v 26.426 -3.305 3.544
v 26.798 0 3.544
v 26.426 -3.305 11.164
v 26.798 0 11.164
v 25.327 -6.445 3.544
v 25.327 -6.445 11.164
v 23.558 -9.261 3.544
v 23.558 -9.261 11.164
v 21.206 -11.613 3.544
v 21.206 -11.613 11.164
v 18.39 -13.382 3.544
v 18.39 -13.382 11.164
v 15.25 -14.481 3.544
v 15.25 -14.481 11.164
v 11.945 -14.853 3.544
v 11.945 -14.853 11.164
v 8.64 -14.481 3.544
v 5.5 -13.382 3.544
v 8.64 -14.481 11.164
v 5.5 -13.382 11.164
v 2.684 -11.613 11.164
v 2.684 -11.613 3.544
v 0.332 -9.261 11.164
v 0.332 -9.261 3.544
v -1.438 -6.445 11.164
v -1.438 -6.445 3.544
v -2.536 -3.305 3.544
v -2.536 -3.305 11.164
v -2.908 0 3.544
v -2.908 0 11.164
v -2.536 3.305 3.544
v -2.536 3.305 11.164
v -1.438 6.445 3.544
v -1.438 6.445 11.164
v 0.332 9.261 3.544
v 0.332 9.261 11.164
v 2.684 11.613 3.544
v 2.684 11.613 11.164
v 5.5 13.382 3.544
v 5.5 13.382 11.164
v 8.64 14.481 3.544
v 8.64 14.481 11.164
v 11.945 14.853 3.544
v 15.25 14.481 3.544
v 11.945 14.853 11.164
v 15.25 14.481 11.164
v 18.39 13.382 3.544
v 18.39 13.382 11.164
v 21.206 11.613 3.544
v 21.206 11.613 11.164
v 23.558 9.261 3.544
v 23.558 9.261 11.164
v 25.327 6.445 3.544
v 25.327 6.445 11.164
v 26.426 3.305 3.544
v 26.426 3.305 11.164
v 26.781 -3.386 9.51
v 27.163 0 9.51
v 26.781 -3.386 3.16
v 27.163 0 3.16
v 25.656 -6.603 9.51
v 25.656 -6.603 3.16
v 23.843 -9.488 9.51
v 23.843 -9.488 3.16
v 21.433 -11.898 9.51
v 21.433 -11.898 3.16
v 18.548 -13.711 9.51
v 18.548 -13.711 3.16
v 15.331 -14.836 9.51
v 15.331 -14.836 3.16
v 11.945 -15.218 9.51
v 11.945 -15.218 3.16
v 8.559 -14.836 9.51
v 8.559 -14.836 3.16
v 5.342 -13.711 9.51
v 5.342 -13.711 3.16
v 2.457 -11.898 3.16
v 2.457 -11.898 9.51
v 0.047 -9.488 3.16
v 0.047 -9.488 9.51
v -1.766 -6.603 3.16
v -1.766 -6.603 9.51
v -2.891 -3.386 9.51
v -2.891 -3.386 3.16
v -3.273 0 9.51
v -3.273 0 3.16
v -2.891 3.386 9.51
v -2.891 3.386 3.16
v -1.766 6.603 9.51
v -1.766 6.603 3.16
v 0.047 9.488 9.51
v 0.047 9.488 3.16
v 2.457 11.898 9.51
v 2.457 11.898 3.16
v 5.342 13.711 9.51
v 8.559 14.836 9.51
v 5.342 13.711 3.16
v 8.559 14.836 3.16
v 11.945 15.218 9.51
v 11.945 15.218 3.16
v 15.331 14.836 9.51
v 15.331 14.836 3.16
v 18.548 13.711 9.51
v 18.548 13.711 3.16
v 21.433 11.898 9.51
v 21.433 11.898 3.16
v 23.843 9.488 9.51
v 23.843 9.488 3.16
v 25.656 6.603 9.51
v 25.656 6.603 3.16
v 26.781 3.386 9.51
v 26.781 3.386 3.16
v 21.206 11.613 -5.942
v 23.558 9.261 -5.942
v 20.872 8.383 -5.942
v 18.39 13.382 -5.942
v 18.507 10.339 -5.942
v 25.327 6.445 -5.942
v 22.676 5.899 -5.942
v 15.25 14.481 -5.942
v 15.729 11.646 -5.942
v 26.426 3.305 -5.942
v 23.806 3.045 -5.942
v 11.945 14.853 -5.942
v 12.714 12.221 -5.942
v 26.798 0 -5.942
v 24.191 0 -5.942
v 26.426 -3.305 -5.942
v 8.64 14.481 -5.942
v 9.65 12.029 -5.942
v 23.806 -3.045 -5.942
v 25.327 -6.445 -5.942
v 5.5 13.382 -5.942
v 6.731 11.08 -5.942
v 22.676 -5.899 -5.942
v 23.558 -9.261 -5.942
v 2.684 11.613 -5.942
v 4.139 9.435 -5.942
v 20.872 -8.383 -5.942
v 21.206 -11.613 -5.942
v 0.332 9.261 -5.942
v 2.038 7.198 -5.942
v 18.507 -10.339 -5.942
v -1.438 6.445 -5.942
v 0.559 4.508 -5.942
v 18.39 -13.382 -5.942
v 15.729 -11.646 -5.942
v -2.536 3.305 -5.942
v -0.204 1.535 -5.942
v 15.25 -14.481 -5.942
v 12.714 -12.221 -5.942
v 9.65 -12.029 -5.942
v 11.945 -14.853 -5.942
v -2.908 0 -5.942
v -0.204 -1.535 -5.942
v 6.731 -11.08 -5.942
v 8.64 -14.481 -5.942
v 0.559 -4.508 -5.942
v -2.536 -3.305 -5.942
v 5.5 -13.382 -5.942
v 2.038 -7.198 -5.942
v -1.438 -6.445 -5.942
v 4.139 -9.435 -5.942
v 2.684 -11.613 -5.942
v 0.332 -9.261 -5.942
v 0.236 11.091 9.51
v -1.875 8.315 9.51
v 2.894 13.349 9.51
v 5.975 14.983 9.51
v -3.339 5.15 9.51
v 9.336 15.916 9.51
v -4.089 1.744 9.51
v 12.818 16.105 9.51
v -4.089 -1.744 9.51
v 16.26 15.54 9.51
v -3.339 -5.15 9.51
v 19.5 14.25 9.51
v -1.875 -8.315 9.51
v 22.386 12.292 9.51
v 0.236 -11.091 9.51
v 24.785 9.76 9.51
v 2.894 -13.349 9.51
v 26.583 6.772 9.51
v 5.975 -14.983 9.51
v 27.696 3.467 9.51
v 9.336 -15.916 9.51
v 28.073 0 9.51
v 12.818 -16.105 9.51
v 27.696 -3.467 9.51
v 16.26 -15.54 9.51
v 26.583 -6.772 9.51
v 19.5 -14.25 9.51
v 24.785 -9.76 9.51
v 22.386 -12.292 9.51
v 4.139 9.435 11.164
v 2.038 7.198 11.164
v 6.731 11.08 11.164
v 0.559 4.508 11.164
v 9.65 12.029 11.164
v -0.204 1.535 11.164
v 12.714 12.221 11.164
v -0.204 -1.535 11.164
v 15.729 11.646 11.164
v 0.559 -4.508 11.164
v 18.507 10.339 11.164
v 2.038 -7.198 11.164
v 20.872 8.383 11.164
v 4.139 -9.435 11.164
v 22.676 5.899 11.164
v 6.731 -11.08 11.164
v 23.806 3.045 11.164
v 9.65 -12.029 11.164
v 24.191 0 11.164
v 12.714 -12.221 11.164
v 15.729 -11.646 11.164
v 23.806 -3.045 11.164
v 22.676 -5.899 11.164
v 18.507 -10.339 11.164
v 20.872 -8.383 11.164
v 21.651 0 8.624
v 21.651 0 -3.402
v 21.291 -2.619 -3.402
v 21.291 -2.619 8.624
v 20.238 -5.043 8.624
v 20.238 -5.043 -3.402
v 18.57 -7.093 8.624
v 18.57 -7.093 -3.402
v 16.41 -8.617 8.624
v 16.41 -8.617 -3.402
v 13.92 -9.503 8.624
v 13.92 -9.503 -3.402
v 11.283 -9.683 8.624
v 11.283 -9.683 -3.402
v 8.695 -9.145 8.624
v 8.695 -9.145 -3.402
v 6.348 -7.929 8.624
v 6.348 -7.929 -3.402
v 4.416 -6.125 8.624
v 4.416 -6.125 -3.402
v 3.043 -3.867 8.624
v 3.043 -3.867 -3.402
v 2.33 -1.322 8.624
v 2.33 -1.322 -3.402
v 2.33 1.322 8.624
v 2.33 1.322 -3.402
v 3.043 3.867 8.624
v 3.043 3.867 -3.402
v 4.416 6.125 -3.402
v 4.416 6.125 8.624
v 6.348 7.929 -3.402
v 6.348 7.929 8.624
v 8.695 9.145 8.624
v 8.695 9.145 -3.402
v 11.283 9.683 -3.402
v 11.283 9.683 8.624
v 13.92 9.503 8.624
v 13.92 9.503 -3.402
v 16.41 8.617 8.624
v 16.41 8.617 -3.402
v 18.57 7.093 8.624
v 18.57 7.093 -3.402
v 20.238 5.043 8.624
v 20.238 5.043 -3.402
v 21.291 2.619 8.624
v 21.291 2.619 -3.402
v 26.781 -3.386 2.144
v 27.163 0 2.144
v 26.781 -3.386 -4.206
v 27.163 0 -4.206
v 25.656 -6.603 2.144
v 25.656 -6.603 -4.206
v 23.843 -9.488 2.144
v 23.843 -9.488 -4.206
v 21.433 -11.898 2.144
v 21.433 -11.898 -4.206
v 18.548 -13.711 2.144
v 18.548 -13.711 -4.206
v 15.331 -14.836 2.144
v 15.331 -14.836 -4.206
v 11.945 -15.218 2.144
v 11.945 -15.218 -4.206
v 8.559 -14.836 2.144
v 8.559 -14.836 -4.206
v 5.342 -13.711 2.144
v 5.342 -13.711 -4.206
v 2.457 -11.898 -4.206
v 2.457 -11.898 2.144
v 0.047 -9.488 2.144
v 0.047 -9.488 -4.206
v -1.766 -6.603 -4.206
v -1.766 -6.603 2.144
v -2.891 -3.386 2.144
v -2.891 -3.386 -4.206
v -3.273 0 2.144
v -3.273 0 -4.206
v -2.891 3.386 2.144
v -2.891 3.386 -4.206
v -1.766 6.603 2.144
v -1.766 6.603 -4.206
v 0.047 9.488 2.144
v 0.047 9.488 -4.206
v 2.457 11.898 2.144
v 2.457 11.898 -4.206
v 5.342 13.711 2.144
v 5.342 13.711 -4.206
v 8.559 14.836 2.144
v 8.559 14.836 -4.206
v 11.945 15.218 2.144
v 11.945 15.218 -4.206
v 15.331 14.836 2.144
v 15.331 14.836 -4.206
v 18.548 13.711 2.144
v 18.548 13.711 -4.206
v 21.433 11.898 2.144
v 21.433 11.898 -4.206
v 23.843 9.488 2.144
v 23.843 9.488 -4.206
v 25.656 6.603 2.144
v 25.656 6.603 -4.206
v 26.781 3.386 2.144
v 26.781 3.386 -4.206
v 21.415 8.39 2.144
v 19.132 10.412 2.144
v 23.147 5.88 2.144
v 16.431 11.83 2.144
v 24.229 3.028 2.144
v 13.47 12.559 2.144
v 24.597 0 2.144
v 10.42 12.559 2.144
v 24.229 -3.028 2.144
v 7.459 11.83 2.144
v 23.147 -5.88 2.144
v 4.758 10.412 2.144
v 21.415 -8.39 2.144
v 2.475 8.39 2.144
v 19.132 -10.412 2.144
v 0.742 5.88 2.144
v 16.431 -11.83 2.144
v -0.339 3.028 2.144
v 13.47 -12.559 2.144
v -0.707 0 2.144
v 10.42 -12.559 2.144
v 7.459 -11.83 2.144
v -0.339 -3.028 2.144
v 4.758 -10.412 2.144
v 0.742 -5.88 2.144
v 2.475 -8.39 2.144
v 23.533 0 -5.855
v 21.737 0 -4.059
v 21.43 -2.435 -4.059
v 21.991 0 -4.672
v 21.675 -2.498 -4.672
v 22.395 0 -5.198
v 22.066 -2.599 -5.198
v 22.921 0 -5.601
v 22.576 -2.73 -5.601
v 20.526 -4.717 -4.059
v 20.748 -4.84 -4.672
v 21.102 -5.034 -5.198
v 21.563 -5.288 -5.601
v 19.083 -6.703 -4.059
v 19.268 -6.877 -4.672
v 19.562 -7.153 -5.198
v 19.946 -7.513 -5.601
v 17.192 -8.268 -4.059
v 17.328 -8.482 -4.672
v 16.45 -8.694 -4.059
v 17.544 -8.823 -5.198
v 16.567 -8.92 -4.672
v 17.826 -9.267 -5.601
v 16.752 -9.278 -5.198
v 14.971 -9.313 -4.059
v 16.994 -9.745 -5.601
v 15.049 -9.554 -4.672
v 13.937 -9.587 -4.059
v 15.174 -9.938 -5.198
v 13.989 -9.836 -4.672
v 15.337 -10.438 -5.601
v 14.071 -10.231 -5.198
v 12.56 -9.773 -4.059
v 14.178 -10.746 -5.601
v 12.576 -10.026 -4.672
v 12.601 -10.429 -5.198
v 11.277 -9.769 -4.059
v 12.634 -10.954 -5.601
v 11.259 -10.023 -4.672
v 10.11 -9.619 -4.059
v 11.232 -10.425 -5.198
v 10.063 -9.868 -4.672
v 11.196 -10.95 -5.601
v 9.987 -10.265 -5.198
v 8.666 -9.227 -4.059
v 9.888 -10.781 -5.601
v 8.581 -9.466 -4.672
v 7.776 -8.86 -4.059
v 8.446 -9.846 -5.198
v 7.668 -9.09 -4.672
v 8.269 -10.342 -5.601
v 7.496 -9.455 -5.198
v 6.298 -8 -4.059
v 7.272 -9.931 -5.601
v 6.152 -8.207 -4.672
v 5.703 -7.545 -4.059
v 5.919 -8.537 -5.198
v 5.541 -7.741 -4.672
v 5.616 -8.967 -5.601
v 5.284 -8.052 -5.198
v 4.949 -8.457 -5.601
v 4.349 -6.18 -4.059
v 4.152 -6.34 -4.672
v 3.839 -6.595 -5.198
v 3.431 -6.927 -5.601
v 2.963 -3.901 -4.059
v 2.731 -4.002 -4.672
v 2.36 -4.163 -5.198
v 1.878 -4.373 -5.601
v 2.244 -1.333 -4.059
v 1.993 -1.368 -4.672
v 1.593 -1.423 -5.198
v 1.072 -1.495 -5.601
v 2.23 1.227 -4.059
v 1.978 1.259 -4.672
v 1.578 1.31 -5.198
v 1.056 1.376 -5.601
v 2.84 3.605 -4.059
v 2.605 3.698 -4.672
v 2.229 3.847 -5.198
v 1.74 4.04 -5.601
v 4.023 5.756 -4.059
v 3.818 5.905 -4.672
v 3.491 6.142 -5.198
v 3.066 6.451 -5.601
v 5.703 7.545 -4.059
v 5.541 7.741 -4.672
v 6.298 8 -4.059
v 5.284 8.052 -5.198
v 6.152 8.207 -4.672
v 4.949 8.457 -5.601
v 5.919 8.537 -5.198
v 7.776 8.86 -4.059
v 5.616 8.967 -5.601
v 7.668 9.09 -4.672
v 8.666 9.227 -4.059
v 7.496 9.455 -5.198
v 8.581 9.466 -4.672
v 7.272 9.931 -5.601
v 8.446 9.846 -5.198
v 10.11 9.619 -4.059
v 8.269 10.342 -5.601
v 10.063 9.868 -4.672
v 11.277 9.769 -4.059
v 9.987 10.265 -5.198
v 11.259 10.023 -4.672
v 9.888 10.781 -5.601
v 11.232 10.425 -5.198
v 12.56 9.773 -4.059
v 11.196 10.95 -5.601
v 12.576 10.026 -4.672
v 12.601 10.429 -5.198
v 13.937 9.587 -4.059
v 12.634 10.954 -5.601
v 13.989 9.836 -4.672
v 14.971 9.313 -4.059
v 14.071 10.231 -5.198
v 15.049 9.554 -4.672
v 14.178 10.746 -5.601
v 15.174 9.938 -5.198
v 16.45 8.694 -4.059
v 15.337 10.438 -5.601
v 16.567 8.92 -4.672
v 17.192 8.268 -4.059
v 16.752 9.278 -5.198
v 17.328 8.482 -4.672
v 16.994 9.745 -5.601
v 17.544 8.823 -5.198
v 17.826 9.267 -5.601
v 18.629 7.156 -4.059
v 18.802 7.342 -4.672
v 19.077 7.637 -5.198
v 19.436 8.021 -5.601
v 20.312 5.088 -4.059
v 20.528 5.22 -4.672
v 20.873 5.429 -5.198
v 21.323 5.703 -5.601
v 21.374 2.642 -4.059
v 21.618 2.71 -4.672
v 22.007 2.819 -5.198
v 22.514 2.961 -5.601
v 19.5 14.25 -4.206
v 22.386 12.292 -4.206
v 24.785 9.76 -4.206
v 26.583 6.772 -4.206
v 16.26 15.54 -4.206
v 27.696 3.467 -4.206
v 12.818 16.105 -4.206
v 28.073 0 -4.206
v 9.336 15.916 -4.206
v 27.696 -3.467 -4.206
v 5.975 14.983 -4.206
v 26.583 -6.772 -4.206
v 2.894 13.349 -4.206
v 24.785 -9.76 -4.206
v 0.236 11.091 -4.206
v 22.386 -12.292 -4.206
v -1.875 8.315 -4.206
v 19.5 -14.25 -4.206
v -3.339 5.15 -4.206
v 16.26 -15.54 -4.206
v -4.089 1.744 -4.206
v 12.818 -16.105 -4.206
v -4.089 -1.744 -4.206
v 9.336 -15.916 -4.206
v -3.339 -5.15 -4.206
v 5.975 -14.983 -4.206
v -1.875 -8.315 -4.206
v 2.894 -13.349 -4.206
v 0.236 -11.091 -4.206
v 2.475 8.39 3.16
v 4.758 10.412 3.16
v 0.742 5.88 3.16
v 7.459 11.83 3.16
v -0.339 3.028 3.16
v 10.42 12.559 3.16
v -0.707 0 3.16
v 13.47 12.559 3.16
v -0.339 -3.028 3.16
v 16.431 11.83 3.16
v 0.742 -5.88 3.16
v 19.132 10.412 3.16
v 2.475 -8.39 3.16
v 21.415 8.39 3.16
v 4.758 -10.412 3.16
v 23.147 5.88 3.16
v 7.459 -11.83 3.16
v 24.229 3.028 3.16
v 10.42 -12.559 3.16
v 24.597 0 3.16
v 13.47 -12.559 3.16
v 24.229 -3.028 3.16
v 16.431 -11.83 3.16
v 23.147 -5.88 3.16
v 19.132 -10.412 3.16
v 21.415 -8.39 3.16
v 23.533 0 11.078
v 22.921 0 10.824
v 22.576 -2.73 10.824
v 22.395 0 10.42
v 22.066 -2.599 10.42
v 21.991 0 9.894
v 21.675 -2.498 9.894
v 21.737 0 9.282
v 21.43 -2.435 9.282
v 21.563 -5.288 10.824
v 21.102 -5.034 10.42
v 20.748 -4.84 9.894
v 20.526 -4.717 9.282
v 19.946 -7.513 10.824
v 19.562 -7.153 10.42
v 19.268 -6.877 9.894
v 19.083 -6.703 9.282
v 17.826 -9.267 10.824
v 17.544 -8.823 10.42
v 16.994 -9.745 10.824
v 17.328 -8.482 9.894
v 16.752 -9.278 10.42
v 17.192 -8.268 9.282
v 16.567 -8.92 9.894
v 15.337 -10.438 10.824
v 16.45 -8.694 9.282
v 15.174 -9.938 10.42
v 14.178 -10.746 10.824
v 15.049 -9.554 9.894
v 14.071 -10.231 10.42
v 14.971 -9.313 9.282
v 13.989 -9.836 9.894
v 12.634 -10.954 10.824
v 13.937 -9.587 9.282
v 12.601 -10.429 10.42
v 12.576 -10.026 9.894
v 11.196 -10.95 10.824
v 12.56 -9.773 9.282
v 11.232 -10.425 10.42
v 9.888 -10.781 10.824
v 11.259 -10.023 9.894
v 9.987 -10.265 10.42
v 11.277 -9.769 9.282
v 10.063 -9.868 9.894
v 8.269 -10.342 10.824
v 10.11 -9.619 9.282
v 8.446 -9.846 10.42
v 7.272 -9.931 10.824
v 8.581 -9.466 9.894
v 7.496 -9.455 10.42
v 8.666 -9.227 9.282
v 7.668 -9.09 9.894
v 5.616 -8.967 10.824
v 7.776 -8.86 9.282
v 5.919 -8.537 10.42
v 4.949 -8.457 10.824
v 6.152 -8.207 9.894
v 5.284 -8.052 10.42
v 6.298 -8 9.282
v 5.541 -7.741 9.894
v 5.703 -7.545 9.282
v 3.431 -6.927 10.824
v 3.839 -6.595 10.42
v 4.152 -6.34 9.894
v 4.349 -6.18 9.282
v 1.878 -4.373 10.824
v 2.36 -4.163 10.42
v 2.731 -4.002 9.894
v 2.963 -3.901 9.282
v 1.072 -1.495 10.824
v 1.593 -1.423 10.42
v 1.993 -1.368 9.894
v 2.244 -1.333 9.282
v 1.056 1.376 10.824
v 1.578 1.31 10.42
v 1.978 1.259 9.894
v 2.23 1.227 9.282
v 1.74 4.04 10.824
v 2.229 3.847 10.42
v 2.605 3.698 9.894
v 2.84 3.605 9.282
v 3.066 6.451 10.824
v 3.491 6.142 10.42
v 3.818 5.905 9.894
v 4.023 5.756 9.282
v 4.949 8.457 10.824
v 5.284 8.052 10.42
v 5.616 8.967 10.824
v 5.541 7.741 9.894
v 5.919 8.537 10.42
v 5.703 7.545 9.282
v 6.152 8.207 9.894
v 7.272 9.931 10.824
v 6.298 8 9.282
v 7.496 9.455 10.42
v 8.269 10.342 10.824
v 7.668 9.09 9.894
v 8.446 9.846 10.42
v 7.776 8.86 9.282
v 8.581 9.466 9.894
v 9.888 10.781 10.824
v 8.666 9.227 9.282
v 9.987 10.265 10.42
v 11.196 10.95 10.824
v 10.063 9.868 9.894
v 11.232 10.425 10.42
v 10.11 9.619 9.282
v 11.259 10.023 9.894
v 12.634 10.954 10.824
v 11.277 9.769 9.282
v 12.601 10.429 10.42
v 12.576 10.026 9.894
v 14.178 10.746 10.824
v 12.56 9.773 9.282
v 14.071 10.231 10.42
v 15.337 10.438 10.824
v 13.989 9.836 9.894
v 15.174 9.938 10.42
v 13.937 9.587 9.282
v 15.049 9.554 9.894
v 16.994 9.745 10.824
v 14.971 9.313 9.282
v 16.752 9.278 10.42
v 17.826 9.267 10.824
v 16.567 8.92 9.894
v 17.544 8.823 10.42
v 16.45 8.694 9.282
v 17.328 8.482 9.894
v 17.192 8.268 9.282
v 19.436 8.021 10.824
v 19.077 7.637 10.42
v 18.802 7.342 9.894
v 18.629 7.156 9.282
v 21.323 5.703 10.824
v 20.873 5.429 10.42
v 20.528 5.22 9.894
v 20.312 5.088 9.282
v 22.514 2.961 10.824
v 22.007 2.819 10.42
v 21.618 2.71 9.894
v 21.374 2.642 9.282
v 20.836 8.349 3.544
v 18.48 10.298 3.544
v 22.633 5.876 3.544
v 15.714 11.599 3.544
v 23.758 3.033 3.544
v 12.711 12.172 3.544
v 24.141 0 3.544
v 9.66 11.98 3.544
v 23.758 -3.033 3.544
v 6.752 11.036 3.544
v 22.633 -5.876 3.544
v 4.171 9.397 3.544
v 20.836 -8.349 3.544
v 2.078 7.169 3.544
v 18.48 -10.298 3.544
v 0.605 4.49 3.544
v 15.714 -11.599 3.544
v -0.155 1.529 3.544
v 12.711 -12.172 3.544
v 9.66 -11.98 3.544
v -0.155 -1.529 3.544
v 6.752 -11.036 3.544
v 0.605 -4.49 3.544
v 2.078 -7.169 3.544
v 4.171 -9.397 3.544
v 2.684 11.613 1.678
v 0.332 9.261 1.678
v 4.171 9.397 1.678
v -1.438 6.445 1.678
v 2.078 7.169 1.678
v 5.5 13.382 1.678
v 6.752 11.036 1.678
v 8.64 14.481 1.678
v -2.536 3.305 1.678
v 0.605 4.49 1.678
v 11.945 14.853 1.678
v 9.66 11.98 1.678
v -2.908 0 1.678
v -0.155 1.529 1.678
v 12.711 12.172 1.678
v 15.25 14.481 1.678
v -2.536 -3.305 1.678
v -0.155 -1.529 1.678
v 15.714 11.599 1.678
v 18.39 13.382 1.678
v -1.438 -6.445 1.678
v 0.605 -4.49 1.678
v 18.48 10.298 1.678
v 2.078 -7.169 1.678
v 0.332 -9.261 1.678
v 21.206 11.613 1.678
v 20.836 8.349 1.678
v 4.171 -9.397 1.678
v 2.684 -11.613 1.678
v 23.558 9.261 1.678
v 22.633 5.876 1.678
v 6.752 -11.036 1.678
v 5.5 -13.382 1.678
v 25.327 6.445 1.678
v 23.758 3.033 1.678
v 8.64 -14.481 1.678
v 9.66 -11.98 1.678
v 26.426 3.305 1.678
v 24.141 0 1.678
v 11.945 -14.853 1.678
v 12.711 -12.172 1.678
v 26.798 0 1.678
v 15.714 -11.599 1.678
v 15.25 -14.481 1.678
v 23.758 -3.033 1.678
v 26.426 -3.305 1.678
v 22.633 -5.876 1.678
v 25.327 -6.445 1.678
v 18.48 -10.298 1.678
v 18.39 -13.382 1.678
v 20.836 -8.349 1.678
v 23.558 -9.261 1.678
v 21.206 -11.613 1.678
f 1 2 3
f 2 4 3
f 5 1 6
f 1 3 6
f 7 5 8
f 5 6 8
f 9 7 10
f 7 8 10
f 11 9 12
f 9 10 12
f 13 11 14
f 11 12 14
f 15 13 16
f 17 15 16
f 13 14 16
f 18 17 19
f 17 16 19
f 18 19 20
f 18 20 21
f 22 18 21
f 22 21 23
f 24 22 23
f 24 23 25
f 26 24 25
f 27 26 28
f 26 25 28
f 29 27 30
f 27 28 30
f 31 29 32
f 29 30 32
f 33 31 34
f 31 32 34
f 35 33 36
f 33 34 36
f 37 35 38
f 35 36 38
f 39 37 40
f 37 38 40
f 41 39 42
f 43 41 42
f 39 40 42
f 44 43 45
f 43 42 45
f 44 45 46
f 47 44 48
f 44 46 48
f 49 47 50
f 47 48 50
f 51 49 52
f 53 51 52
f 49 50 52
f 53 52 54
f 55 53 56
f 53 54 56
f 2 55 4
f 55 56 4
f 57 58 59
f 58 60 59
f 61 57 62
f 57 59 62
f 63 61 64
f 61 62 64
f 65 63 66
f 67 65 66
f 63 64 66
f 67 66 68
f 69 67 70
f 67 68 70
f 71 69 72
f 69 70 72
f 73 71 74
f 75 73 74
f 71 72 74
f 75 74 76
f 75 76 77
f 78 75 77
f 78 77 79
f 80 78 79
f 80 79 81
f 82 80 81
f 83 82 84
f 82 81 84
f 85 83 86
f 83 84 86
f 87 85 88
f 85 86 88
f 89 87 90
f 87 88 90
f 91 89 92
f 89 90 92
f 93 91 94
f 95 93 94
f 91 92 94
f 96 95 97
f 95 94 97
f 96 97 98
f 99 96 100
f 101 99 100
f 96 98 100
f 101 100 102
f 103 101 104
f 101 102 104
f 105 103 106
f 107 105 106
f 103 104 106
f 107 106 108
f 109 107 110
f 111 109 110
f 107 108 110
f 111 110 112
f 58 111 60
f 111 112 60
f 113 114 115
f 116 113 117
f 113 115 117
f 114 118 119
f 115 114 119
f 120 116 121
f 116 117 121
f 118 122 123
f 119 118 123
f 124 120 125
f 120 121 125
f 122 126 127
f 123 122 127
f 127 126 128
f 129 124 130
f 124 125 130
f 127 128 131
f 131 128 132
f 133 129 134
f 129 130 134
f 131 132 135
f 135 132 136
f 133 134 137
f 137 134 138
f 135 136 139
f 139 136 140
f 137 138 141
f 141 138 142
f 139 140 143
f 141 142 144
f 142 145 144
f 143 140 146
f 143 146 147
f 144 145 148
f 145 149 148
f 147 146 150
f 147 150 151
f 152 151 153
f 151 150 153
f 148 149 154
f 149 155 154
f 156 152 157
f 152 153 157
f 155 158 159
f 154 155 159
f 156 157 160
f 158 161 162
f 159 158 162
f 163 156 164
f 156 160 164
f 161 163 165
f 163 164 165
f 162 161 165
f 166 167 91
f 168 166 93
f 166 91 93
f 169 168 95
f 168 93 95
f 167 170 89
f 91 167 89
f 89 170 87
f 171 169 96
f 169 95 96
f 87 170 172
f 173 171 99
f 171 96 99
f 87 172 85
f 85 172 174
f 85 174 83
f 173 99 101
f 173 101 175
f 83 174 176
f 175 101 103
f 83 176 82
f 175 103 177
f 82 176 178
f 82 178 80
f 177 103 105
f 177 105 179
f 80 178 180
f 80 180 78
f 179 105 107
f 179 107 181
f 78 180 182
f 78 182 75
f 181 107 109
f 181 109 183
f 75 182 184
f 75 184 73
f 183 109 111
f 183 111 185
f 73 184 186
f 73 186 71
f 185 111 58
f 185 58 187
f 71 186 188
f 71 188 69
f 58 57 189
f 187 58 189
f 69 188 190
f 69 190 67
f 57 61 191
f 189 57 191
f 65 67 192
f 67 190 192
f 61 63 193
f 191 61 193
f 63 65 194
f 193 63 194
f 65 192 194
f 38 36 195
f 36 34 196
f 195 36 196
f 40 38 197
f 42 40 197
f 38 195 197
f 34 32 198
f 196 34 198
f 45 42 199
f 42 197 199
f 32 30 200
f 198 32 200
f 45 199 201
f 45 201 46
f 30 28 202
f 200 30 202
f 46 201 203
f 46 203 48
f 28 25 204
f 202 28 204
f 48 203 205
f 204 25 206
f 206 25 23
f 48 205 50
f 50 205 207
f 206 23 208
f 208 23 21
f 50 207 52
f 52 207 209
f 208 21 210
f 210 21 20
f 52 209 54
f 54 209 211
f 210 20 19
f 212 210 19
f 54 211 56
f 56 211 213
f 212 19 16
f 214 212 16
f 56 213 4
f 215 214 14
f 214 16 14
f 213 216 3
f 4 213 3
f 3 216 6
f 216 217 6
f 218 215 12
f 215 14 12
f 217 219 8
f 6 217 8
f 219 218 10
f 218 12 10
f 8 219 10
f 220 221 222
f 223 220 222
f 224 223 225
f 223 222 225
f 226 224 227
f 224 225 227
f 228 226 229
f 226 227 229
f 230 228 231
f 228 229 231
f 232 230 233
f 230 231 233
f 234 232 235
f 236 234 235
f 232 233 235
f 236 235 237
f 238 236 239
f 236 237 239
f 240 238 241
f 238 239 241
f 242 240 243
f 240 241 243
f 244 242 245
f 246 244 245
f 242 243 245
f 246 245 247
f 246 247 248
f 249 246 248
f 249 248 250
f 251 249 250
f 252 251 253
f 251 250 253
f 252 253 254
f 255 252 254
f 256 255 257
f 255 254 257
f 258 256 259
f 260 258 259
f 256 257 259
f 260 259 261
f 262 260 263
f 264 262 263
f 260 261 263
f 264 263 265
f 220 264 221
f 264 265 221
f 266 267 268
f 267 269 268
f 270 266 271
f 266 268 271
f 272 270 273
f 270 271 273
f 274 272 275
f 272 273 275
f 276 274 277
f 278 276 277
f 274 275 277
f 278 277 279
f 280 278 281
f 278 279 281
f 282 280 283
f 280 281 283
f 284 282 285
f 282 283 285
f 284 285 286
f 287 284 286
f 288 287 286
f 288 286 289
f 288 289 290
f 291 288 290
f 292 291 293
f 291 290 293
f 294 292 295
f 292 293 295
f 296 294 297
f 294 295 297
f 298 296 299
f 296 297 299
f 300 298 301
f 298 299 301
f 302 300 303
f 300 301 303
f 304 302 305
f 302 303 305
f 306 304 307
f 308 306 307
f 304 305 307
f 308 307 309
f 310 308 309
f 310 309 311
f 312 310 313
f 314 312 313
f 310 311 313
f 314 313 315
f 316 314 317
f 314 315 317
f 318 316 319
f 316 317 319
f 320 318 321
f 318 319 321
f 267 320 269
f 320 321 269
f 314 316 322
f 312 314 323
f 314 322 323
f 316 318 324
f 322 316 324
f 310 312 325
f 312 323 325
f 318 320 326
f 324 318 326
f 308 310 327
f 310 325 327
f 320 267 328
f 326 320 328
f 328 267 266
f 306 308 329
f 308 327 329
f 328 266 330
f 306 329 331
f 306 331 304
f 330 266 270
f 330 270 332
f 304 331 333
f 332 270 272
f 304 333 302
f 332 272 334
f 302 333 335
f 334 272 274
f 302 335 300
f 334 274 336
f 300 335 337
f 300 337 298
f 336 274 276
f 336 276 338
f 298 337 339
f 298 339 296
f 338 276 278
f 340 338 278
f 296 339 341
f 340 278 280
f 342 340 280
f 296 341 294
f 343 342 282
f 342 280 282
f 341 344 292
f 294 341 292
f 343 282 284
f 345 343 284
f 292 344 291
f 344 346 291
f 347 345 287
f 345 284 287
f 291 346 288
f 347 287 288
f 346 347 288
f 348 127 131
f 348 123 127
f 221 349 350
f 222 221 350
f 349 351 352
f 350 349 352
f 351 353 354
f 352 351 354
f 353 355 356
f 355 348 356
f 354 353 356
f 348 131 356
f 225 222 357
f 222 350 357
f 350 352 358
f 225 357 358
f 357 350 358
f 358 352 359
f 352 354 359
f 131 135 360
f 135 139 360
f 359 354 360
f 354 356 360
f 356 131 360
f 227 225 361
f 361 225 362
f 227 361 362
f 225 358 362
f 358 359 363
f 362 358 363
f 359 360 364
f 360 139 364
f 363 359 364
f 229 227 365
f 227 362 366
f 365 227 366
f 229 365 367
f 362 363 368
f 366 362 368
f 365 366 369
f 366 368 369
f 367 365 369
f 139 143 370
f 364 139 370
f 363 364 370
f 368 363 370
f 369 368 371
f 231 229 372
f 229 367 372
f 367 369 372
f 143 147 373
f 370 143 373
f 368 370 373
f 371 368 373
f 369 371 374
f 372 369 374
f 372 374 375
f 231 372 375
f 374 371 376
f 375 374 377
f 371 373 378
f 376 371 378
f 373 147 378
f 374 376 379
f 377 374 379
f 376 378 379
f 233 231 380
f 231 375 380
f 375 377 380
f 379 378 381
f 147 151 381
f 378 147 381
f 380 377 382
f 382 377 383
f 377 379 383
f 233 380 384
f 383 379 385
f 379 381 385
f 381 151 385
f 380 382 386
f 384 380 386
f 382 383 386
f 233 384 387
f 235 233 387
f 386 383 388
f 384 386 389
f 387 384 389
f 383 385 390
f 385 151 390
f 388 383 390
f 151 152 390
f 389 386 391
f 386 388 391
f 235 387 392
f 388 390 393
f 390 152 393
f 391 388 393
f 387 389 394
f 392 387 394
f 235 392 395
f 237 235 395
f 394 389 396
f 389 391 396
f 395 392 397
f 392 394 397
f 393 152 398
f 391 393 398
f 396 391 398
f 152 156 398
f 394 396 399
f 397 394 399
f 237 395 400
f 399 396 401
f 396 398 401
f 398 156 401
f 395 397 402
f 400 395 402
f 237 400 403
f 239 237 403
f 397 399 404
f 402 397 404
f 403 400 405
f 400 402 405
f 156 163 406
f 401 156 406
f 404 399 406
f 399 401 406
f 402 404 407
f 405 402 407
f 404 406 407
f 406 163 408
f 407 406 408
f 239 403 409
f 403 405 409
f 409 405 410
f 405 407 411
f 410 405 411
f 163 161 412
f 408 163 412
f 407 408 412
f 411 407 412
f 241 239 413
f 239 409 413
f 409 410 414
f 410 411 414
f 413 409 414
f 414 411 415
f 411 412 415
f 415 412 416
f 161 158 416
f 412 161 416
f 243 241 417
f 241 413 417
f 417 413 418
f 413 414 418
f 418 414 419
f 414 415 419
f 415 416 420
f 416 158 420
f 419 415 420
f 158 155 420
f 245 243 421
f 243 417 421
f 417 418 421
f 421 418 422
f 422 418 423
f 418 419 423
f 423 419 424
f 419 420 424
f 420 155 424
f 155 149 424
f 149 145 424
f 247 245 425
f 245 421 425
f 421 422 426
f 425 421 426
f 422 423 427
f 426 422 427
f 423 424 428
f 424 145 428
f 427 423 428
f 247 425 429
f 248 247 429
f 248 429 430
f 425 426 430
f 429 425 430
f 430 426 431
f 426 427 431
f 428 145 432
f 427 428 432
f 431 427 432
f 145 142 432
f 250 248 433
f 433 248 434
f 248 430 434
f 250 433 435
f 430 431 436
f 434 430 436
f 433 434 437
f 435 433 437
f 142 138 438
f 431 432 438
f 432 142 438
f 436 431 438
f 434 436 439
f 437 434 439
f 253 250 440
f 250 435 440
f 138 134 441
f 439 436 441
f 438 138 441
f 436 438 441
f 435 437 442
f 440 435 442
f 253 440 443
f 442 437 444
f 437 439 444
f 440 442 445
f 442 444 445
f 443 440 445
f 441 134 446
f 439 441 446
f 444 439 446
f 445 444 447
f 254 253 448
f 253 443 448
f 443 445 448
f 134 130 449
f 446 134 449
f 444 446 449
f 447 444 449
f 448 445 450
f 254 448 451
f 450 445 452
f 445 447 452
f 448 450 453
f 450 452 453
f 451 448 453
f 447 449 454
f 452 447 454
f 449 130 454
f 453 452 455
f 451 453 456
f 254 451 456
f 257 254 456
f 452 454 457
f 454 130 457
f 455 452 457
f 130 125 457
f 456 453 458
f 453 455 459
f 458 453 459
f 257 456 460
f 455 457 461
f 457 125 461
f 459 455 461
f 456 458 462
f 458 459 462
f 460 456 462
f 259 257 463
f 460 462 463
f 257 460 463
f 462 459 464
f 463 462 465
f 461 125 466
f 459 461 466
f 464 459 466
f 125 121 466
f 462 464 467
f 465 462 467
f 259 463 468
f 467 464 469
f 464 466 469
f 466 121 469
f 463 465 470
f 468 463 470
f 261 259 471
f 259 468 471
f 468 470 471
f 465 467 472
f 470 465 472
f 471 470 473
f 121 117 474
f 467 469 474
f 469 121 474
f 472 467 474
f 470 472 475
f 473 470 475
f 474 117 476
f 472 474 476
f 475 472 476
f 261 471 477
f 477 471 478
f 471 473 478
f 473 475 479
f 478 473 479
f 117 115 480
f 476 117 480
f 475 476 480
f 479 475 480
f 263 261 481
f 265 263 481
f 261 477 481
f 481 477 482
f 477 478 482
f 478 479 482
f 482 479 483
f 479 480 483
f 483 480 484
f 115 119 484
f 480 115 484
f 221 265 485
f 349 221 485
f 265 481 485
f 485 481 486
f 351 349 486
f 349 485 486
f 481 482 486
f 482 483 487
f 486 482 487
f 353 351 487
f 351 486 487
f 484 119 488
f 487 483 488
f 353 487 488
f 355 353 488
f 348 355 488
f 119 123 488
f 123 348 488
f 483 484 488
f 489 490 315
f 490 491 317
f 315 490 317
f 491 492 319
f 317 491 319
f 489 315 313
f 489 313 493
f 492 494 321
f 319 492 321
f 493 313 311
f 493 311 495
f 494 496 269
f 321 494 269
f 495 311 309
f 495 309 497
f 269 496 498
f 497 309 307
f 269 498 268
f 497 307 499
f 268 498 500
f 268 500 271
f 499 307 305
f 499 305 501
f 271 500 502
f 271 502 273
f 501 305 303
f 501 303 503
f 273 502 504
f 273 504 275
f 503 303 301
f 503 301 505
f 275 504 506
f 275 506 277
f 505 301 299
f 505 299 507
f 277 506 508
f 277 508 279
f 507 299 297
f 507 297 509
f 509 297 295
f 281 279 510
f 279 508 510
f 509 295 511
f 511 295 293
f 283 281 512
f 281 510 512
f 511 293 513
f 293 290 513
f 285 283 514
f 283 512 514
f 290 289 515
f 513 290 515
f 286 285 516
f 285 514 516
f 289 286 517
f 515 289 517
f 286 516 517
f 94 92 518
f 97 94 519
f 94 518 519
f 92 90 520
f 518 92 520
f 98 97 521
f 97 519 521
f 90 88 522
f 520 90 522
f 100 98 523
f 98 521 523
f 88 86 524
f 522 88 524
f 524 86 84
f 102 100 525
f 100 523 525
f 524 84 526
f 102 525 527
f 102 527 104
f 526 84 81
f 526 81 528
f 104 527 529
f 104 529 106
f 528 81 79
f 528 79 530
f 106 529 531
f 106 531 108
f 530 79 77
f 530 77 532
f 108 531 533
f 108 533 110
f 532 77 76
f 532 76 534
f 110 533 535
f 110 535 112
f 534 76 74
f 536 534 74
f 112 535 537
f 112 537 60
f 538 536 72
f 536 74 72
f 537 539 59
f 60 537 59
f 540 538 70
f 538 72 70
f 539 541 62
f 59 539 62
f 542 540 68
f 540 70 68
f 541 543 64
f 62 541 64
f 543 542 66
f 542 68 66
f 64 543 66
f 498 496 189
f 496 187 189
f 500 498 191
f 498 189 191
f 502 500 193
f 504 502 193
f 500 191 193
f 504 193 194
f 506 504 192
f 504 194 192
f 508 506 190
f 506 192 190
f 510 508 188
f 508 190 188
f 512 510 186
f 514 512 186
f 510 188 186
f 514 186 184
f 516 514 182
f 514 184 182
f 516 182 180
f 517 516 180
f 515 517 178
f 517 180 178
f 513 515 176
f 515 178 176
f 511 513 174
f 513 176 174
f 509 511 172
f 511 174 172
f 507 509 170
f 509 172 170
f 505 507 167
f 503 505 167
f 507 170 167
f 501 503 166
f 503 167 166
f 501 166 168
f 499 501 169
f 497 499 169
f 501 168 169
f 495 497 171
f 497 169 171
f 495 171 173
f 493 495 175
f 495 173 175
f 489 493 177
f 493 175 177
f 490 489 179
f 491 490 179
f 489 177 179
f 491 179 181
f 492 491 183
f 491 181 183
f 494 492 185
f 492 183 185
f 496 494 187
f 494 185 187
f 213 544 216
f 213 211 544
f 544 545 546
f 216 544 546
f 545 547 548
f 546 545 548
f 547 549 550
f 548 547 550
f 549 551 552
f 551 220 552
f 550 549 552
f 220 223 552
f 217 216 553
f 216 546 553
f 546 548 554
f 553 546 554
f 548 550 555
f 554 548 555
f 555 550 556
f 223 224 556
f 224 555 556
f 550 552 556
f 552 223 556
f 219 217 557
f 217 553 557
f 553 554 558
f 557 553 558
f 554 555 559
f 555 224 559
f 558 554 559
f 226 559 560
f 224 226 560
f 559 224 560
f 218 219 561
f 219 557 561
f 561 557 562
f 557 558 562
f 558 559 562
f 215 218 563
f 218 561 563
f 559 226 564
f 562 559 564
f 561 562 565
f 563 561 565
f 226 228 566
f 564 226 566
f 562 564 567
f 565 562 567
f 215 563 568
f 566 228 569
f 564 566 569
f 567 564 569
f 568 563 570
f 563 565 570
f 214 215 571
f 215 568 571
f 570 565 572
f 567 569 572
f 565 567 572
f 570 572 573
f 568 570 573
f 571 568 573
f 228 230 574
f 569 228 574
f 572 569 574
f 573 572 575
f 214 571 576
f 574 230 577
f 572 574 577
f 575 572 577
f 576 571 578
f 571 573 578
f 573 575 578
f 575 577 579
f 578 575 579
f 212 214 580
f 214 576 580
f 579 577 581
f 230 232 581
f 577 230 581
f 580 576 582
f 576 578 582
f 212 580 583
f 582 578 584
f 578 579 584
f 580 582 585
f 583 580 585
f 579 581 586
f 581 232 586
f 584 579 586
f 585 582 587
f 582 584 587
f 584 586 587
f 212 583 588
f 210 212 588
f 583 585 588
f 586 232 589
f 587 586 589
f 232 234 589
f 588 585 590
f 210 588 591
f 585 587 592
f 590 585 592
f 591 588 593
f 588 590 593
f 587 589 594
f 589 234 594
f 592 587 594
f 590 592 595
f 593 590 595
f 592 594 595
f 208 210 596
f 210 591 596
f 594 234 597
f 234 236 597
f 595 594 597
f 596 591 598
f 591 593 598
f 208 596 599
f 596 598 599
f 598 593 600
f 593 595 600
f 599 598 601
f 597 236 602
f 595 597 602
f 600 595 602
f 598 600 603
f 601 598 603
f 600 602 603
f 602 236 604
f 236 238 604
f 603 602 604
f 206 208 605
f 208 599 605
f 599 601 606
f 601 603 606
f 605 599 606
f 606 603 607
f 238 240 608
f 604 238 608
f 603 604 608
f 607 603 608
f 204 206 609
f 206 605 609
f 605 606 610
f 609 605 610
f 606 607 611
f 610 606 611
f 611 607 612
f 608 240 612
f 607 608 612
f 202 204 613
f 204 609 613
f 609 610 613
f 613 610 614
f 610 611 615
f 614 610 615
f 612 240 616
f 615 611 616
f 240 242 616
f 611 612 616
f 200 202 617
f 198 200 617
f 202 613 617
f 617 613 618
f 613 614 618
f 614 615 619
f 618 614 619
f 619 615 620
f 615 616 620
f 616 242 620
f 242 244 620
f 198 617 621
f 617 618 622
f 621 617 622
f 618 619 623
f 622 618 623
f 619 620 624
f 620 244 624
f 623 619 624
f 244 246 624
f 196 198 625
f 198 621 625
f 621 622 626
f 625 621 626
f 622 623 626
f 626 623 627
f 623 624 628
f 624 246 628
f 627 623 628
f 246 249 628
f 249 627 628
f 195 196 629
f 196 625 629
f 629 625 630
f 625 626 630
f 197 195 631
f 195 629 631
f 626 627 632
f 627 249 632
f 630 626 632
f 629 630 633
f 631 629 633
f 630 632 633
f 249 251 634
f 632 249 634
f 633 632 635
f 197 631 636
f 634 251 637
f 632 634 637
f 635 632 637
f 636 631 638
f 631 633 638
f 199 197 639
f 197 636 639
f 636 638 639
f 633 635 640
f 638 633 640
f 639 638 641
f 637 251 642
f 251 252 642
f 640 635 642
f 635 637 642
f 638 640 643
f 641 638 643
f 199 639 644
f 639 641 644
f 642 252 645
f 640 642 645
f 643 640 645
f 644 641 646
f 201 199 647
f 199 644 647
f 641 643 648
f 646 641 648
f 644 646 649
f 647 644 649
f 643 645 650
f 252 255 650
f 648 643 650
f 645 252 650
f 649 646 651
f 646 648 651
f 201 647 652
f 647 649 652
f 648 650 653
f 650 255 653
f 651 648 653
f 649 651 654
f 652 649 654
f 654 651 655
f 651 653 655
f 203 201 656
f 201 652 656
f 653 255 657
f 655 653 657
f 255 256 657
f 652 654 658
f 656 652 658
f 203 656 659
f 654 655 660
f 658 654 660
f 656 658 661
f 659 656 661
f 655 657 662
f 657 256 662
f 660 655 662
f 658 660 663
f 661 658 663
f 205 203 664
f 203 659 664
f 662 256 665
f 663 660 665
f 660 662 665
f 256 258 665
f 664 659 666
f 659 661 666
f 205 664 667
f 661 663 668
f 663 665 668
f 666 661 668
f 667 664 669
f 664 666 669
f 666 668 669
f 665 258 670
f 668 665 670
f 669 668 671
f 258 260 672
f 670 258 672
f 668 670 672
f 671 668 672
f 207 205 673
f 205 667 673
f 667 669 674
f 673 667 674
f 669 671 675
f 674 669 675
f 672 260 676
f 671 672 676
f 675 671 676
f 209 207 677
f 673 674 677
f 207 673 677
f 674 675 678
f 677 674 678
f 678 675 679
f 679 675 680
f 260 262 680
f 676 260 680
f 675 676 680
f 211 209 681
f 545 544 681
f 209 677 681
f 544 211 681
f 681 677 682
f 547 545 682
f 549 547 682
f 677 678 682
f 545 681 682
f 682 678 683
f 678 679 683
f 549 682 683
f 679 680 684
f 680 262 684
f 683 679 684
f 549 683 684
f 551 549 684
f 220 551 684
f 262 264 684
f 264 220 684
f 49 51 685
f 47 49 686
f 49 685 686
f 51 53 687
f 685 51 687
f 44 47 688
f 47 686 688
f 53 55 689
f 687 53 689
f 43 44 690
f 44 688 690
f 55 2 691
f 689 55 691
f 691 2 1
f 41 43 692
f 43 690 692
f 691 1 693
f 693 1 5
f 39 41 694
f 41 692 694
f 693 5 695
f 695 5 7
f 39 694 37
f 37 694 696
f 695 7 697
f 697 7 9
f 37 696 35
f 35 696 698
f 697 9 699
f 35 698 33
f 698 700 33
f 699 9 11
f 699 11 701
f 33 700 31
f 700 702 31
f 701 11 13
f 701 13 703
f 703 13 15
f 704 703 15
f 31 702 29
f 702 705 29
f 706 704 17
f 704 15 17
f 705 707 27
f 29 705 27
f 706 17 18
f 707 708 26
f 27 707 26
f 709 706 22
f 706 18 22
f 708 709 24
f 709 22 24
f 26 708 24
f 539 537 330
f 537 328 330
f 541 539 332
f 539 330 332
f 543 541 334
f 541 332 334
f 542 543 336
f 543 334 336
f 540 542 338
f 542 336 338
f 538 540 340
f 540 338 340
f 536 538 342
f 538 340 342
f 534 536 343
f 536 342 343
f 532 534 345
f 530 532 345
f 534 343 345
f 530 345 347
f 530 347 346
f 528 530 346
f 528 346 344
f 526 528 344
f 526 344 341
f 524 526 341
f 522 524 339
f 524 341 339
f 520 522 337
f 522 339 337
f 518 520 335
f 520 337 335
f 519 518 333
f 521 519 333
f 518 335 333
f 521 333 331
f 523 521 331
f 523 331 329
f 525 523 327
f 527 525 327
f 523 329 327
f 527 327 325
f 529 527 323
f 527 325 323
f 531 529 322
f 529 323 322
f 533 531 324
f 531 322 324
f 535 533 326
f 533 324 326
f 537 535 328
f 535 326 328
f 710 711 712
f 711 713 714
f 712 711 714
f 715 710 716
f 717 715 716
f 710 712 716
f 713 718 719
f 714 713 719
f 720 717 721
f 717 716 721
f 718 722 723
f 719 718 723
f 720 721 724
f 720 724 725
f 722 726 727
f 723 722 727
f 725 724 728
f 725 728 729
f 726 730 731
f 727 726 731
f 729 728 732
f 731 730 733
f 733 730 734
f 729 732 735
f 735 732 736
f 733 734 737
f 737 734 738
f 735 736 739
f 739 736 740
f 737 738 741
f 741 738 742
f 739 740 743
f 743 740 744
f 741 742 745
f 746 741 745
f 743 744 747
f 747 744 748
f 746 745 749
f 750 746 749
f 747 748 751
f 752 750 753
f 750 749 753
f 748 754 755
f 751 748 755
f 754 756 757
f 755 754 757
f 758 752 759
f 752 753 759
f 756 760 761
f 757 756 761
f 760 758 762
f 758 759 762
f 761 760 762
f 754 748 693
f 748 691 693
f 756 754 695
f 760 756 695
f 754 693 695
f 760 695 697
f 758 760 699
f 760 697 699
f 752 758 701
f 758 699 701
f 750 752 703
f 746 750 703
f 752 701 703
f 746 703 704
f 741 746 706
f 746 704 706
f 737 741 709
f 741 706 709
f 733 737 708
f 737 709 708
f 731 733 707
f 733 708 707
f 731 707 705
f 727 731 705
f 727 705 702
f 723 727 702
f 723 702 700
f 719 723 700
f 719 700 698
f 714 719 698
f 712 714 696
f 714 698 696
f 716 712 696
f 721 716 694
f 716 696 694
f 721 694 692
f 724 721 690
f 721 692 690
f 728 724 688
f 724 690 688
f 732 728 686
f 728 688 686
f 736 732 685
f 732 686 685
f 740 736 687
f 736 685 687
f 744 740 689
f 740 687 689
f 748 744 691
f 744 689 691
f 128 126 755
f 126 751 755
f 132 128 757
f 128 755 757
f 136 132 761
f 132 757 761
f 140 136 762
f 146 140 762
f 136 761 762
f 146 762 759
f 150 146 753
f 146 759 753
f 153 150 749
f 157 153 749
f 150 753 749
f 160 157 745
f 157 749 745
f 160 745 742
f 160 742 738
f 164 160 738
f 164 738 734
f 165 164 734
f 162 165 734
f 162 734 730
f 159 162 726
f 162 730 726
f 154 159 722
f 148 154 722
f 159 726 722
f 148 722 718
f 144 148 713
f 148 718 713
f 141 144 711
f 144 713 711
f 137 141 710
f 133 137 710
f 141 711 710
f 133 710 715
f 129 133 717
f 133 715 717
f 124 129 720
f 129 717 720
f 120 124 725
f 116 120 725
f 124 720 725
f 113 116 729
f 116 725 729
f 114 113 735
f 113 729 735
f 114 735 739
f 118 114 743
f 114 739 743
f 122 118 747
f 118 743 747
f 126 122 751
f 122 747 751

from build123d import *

# Parameters (mm, degrees)
F2_R = 2.54


with BuildPart() as f1:
    # F0 (on Front) → F1 (revolve)
    with BuildSketch(Plane.XZ):
        Polygon((26.7984219617, 3.5442614616), (26.7984219617, 11.1642614616), (21.6506298458, 11.1642614616), (21.6506298458, -5.9417629211), (26.7984219617, -5.9417629211), (26.7984219617, 1.6782370789), (24.1413731128, 1.6782370789), (24.1413731128, 3.5442614616), align=None)
    revolve(axis=Axis((11.9449845724, 0, 2.0704427734), (0, 0, -1)))

    # F2
    f2_edges = [f1.edges().sort_by_distance(p)[0] for p in [
        (2.239339, 0, 11.164261),
        (2.239339, 0, -5.941763),
    ]]
    fillet(f2_edges, radius=F2_R)


with BuildPart() as f1b:
    # F0 (on Front) → F1, piece 2 (revolve)
    with BuildSketch(Plane.XZ):
        Polygon((28.0732959509, 9.5104135346), (27.162745595, 9.5104135346), (27.162745595, 3.1604135346), (24.5966482908, 3.1604135346), (24.5966482908, 2.1444135346), (27.162745595, 2.1444135346), (27.162745595, -4.2055864654), (28.0732959509, -4.2055864654), align=None)
    revolve(axis=Axis((11.9449845724, 0, 2.0704427734), (0, 0, -1)))


solid = Compound([f1.part, f1b.part])
